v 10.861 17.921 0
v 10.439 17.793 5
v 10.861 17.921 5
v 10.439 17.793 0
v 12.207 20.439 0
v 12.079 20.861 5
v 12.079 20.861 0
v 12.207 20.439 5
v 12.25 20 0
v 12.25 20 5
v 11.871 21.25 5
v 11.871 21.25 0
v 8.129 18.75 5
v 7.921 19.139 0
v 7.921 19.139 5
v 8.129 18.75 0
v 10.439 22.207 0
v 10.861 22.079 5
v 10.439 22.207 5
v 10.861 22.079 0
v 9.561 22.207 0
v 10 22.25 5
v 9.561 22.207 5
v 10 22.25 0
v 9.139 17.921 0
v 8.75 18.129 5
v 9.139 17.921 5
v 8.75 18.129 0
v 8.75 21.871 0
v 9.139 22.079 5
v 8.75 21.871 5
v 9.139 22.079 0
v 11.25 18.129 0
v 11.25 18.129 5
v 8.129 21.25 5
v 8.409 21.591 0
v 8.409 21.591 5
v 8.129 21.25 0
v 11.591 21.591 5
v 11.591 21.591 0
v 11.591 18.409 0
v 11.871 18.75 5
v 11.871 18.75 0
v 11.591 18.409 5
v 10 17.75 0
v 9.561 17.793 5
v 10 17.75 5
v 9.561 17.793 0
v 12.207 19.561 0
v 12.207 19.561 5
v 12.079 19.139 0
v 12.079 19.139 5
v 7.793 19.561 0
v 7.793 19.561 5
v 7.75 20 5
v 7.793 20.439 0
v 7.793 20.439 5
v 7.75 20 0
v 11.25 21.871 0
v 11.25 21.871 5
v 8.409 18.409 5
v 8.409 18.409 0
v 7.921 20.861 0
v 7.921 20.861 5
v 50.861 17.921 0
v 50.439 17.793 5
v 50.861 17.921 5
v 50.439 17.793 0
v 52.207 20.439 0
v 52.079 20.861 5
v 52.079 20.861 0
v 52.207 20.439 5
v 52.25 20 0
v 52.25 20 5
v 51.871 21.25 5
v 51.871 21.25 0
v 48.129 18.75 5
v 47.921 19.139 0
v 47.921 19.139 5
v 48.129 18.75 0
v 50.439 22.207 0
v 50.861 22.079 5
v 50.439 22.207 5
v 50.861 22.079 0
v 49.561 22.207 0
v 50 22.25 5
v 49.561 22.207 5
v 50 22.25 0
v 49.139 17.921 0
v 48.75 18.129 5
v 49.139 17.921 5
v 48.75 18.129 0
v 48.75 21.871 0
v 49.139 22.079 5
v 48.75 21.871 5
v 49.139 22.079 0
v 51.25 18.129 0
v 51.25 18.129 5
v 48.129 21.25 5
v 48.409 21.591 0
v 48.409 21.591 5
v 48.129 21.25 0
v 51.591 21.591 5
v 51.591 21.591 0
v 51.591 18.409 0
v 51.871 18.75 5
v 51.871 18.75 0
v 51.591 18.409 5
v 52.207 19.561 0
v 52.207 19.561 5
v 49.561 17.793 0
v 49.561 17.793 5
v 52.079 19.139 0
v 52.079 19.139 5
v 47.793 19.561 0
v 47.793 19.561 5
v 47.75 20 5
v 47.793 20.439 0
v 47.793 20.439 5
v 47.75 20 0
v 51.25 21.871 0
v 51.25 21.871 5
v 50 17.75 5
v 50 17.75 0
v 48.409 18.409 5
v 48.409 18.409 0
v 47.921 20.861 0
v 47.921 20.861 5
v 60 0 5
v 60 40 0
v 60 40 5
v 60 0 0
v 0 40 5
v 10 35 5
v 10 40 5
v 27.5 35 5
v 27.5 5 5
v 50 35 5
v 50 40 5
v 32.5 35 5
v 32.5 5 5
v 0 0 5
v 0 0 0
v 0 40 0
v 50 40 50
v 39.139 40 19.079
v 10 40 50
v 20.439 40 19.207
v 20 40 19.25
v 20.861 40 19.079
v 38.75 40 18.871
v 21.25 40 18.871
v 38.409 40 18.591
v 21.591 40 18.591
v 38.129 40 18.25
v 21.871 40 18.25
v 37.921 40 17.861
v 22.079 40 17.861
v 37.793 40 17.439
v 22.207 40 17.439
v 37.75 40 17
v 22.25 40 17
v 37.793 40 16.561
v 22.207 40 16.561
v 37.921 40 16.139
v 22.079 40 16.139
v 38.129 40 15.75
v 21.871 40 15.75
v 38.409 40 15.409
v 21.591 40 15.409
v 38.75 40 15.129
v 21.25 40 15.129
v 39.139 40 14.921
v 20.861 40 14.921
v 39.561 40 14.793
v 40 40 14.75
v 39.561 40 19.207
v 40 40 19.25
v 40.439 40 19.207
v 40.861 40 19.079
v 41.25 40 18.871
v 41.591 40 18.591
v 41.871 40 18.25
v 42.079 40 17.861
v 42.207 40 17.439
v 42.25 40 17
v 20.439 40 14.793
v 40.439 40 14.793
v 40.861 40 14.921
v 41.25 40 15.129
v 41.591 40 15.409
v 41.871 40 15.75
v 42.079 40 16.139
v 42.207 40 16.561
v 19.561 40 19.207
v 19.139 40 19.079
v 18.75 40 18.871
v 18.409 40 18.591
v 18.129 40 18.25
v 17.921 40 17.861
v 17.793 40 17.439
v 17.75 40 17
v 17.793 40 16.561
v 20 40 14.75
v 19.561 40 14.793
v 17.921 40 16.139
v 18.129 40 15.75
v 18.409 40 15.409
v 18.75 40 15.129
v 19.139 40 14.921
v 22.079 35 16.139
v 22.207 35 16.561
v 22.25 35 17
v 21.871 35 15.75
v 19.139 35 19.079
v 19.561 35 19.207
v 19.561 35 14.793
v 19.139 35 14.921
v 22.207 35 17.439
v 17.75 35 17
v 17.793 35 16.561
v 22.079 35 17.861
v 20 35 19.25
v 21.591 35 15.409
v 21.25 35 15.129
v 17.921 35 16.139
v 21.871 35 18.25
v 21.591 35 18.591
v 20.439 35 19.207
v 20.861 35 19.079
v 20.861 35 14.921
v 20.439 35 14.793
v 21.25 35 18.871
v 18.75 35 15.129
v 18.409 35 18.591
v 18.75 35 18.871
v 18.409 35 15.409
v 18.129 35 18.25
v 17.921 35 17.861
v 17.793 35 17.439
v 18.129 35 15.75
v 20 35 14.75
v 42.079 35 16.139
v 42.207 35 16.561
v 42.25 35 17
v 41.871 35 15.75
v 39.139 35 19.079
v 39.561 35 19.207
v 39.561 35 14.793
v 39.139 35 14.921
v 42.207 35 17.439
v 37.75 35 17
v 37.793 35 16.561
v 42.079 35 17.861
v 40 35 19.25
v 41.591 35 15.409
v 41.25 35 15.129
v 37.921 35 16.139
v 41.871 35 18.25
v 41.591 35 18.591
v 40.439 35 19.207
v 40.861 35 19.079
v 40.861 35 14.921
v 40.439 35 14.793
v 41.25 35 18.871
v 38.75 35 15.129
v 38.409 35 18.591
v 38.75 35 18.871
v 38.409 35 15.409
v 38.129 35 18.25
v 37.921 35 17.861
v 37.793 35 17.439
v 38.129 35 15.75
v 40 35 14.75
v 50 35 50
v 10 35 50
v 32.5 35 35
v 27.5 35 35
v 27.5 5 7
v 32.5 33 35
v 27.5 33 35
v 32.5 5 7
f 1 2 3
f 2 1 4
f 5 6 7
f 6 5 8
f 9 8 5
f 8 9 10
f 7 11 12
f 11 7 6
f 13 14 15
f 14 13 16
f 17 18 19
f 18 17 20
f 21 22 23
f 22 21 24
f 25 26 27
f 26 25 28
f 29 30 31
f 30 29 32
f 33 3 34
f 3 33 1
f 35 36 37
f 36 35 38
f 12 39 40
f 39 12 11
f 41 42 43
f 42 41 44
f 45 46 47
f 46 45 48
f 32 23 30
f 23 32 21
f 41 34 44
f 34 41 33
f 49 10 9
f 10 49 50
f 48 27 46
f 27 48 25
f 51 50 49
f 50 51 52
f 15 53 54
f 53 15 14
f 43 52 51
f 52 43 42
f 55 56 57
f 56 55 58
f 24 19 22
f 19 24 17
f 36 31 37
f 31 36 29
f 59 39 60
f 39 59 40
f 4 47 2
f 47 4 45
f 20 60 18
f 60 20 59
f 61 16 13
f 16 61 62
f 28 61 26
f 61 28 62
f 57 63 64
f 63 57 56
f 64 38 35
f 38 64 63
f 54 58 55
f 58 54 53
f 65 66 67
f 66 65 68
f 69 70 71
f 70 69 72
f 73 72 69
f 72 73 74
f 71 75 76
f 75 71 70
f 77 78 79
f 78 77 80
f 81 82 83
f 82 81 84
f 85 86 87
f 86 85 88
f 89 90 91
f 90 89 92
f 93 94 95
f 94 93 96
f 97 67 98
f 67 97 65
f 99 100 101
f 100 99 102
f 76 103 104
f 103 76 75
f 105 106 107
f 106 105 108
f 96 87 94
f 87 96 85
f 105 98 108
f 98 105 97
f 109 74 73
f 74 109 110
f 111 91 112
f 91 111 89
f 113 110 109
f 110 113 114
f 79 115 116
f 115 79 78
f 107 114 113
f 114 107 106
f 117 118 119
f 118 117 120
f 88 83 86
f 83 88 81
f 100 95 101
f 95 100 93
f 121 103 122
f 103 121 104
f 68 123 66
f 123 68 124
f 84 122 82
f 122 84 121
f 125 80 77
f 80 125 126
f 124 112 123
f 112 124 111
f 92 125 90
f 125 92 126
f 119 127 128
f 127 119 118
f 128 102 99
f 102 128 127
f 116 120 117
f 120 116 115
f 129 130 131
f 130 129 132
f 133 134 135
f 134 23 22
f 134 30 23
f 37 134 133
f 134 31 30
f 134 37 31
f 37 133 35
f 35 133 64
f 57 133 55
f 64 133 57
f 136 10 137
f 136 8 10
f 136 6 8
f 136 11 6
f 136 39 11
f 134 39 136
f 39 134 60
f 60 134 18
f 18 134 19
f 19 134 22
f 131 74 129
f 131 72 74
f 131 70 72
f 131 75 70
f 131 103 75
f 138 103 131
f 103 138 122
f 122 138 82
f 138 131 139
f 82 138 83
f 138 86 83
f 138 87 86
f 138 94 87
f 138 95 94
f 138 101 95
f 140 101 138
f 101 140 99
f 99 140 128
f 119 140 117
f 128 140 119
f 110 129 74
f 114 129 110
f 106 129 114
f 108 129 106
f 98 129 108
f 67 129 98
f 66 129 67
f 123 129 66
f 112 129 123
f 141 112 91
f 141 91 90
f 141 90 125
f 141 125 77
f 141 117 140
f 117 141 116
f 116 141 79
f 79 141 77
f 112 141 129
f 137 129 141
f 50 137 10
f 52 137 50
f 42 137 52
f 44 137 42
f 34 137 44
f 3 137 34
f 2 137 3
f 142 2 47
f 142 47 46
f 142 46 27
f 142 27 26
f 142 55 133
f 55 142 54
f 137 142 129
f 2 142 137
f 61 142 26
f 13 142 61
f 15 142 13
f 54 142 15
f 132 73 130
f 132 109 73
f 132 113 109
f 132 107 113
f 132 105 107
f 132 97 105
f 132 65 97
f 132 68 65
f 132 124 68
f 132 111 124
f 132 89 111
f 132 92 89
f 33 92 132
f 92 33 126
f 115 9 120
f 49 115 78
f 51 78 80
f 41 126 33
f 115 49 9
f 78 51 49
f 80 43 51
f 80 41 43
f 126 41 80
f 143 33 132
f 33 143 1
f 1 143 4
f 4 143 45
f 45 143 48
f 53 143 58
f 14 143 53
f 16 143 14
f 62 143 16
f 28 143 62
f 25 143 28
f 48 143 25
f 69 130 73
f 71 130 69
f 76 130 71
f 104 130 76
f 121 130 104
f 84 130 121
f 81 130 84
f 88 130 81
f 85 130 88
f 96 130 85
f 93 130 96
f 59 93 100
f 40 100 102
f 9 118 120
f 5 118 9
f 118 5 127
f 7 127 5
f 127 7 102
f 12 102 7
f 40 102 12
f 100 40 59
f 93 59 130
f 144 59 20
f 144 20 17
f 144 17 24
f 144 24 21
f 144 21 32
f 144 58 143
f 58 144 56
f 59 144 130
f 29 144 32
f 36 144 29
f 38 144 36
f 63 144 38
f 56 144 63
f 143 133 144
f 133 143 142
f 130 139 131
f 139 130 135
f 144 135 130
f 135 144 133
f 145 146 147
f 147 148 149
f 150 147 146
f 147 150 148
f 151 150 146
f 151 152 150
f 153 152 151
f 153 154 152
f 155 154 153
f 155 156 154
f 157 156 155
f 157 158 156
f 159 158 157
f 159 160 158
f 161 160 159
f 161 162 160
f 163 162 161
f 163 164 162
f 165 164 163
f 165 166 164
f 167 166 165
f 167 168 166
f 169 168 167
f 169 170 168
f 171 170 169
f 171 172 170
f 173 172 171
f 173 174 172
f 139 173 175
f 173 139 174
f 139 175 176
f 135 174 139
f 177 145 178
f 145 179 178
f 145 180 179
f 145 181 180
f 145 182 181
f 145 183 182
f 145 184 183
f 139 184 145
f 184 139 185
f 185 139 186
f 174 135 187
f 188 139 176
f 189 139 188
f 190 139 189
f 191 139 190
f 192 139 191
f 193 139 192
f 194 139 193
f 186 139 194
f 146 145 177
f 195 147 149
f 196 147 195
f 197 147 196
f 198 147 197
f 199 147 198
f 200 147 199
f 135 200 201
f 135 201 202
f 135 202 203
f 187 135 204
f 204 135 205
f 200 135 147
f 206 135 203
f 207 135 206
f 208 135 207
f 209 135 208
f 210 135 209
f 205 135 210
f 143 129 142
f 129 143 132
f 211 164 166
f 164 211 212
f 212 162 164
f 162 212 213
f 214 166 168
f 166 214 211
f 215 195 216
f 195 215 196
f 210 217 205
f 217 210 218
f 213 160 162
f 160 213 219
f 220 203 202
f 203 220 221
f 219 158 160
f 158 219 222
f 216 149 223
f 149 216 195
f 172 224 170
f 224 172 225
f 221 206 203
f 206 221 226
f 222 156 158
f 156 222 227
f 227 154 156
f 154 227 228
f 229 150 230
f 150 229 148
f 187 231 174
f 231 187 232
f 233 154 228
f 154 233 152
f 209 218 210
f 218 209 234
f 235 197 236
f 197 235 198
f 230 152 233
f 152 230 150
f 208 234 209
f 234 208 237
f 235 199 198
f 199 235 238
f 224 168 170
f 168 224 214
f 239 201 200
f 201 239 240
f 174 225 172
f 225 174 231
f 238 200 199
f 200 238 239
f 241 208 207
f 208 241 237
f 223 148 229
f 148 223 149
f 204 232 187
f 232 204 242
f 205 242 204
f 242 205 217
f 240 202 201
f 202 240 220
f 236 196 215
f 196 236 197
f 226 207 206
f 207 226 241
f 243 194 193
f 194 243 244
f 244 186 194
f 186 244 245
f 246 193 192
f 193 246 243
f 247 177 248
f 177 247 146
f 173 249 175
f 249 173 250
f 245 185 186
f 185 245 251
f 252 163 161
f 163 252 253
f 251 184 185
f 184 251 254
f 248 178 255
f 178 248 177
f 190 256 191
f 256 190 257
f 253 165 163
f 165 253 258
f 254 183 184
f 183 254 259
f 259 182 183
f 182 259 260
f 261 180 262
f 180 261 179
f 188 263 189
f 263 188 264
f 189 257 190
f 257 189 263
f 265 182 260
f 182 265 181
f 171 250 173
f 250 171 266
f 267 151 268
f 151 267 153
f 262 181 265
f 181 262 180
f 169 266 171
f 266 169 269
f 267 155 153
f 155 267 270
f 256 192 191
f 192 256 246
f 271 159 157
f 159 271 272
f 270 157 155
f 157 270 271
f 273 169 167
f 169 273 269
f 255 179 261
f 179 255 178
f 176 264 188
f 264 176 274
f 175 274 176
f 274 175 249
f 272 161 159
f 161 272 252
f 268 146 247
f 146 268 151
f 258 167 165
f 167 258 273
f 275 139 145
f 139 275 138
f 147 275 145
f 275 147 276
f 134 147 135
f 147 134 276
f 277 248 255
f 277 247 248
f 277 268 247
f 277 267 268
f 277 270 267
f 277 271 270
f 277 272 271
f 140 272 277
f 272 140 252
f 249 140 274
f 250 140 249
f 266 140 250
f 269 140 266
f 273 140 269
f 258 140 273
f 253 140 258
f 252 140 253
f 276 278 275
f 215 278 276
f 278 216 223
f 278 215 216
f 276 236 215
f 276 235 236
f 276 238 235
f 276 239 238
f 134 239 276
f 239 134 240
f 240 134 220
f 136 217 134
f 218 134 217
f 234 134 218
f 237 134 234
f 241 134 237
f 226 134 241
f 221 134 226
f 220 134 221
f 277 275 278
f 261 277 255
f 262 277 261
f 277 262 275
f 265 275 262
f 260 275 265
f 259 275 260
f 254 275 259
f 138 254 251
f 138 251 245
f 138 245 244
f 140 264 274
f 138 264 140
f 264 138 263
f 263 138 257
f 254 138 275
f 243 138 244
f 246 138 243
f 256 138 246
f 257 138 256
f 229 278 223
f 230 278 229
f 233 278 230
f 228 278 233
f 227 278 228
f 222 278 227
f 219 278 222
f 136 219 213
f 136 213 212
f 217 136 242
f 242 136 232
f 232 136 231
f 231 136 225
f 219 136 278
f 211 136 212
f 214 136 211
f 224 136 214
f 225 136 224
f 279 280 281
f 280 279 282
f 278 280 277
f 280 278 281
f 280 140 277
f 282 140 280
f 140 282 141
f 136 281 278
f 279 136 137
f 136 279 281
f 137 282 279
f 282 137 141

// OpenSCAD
// L-bracket for Mere Mortals.
// Base 60 x 40 x 5 mm, upright 40 x 45 x 5 mm, gusset 30 x 30 x 5 mm.
// Four M4 clearance holes (4.5 mm). All units mm.
// Render: openscad -o bracket.stl bracket.scad

base_l = 60; base_w = 40; base_t = 5;
up_w = 40; up_t = 5; up_h = 45;
up_x0 = (base_l - up_w) / 2;  // upright centered on the base
hole_d = 4.5;                 // M4 clearance (see Measuring and Tolerances)
gus_leg = 30; gus_t = 5;

module base_plate() {
    difference() {
        cube([base_l, base_w, base_t]);
        for (x = [10, base_l - 10])
            translate([x, base_w / 2, -1])
                cylinder(d = hole_d, h = base_t + 2, $fn = 32);
    }
}

module upright() {
    difference() {
        translate([up_x0, base_w - up_t, base_t])
            cube([up_w, up_t, up_h]);
        for (x = [up_x0 + 10, up_x0 + up_w - 10])
            translate([x, base_w - up_t - 1, base_t + 12])
                rotate([-90, 0, 0])
                    cylinder(d = hole_d, h = up_t + 2, $fn = 32);
    }
}

module gusset() {
    // Triangular rib via hull(): a flat plate on the base
    // shrink-wrapped with a vertical plate against the upright.
    x0 = (base_l - gus_t) / 2;
    hull() {
        translate([x0, 5, base_t])
            cube([gus_t, gus_leg, 2]);
        translate([x0, base_w - up_t - 2, base_t])
            cube([gus_t, 2, gus_leg]);
    }
}

base_plate();
upright();
gusset();
